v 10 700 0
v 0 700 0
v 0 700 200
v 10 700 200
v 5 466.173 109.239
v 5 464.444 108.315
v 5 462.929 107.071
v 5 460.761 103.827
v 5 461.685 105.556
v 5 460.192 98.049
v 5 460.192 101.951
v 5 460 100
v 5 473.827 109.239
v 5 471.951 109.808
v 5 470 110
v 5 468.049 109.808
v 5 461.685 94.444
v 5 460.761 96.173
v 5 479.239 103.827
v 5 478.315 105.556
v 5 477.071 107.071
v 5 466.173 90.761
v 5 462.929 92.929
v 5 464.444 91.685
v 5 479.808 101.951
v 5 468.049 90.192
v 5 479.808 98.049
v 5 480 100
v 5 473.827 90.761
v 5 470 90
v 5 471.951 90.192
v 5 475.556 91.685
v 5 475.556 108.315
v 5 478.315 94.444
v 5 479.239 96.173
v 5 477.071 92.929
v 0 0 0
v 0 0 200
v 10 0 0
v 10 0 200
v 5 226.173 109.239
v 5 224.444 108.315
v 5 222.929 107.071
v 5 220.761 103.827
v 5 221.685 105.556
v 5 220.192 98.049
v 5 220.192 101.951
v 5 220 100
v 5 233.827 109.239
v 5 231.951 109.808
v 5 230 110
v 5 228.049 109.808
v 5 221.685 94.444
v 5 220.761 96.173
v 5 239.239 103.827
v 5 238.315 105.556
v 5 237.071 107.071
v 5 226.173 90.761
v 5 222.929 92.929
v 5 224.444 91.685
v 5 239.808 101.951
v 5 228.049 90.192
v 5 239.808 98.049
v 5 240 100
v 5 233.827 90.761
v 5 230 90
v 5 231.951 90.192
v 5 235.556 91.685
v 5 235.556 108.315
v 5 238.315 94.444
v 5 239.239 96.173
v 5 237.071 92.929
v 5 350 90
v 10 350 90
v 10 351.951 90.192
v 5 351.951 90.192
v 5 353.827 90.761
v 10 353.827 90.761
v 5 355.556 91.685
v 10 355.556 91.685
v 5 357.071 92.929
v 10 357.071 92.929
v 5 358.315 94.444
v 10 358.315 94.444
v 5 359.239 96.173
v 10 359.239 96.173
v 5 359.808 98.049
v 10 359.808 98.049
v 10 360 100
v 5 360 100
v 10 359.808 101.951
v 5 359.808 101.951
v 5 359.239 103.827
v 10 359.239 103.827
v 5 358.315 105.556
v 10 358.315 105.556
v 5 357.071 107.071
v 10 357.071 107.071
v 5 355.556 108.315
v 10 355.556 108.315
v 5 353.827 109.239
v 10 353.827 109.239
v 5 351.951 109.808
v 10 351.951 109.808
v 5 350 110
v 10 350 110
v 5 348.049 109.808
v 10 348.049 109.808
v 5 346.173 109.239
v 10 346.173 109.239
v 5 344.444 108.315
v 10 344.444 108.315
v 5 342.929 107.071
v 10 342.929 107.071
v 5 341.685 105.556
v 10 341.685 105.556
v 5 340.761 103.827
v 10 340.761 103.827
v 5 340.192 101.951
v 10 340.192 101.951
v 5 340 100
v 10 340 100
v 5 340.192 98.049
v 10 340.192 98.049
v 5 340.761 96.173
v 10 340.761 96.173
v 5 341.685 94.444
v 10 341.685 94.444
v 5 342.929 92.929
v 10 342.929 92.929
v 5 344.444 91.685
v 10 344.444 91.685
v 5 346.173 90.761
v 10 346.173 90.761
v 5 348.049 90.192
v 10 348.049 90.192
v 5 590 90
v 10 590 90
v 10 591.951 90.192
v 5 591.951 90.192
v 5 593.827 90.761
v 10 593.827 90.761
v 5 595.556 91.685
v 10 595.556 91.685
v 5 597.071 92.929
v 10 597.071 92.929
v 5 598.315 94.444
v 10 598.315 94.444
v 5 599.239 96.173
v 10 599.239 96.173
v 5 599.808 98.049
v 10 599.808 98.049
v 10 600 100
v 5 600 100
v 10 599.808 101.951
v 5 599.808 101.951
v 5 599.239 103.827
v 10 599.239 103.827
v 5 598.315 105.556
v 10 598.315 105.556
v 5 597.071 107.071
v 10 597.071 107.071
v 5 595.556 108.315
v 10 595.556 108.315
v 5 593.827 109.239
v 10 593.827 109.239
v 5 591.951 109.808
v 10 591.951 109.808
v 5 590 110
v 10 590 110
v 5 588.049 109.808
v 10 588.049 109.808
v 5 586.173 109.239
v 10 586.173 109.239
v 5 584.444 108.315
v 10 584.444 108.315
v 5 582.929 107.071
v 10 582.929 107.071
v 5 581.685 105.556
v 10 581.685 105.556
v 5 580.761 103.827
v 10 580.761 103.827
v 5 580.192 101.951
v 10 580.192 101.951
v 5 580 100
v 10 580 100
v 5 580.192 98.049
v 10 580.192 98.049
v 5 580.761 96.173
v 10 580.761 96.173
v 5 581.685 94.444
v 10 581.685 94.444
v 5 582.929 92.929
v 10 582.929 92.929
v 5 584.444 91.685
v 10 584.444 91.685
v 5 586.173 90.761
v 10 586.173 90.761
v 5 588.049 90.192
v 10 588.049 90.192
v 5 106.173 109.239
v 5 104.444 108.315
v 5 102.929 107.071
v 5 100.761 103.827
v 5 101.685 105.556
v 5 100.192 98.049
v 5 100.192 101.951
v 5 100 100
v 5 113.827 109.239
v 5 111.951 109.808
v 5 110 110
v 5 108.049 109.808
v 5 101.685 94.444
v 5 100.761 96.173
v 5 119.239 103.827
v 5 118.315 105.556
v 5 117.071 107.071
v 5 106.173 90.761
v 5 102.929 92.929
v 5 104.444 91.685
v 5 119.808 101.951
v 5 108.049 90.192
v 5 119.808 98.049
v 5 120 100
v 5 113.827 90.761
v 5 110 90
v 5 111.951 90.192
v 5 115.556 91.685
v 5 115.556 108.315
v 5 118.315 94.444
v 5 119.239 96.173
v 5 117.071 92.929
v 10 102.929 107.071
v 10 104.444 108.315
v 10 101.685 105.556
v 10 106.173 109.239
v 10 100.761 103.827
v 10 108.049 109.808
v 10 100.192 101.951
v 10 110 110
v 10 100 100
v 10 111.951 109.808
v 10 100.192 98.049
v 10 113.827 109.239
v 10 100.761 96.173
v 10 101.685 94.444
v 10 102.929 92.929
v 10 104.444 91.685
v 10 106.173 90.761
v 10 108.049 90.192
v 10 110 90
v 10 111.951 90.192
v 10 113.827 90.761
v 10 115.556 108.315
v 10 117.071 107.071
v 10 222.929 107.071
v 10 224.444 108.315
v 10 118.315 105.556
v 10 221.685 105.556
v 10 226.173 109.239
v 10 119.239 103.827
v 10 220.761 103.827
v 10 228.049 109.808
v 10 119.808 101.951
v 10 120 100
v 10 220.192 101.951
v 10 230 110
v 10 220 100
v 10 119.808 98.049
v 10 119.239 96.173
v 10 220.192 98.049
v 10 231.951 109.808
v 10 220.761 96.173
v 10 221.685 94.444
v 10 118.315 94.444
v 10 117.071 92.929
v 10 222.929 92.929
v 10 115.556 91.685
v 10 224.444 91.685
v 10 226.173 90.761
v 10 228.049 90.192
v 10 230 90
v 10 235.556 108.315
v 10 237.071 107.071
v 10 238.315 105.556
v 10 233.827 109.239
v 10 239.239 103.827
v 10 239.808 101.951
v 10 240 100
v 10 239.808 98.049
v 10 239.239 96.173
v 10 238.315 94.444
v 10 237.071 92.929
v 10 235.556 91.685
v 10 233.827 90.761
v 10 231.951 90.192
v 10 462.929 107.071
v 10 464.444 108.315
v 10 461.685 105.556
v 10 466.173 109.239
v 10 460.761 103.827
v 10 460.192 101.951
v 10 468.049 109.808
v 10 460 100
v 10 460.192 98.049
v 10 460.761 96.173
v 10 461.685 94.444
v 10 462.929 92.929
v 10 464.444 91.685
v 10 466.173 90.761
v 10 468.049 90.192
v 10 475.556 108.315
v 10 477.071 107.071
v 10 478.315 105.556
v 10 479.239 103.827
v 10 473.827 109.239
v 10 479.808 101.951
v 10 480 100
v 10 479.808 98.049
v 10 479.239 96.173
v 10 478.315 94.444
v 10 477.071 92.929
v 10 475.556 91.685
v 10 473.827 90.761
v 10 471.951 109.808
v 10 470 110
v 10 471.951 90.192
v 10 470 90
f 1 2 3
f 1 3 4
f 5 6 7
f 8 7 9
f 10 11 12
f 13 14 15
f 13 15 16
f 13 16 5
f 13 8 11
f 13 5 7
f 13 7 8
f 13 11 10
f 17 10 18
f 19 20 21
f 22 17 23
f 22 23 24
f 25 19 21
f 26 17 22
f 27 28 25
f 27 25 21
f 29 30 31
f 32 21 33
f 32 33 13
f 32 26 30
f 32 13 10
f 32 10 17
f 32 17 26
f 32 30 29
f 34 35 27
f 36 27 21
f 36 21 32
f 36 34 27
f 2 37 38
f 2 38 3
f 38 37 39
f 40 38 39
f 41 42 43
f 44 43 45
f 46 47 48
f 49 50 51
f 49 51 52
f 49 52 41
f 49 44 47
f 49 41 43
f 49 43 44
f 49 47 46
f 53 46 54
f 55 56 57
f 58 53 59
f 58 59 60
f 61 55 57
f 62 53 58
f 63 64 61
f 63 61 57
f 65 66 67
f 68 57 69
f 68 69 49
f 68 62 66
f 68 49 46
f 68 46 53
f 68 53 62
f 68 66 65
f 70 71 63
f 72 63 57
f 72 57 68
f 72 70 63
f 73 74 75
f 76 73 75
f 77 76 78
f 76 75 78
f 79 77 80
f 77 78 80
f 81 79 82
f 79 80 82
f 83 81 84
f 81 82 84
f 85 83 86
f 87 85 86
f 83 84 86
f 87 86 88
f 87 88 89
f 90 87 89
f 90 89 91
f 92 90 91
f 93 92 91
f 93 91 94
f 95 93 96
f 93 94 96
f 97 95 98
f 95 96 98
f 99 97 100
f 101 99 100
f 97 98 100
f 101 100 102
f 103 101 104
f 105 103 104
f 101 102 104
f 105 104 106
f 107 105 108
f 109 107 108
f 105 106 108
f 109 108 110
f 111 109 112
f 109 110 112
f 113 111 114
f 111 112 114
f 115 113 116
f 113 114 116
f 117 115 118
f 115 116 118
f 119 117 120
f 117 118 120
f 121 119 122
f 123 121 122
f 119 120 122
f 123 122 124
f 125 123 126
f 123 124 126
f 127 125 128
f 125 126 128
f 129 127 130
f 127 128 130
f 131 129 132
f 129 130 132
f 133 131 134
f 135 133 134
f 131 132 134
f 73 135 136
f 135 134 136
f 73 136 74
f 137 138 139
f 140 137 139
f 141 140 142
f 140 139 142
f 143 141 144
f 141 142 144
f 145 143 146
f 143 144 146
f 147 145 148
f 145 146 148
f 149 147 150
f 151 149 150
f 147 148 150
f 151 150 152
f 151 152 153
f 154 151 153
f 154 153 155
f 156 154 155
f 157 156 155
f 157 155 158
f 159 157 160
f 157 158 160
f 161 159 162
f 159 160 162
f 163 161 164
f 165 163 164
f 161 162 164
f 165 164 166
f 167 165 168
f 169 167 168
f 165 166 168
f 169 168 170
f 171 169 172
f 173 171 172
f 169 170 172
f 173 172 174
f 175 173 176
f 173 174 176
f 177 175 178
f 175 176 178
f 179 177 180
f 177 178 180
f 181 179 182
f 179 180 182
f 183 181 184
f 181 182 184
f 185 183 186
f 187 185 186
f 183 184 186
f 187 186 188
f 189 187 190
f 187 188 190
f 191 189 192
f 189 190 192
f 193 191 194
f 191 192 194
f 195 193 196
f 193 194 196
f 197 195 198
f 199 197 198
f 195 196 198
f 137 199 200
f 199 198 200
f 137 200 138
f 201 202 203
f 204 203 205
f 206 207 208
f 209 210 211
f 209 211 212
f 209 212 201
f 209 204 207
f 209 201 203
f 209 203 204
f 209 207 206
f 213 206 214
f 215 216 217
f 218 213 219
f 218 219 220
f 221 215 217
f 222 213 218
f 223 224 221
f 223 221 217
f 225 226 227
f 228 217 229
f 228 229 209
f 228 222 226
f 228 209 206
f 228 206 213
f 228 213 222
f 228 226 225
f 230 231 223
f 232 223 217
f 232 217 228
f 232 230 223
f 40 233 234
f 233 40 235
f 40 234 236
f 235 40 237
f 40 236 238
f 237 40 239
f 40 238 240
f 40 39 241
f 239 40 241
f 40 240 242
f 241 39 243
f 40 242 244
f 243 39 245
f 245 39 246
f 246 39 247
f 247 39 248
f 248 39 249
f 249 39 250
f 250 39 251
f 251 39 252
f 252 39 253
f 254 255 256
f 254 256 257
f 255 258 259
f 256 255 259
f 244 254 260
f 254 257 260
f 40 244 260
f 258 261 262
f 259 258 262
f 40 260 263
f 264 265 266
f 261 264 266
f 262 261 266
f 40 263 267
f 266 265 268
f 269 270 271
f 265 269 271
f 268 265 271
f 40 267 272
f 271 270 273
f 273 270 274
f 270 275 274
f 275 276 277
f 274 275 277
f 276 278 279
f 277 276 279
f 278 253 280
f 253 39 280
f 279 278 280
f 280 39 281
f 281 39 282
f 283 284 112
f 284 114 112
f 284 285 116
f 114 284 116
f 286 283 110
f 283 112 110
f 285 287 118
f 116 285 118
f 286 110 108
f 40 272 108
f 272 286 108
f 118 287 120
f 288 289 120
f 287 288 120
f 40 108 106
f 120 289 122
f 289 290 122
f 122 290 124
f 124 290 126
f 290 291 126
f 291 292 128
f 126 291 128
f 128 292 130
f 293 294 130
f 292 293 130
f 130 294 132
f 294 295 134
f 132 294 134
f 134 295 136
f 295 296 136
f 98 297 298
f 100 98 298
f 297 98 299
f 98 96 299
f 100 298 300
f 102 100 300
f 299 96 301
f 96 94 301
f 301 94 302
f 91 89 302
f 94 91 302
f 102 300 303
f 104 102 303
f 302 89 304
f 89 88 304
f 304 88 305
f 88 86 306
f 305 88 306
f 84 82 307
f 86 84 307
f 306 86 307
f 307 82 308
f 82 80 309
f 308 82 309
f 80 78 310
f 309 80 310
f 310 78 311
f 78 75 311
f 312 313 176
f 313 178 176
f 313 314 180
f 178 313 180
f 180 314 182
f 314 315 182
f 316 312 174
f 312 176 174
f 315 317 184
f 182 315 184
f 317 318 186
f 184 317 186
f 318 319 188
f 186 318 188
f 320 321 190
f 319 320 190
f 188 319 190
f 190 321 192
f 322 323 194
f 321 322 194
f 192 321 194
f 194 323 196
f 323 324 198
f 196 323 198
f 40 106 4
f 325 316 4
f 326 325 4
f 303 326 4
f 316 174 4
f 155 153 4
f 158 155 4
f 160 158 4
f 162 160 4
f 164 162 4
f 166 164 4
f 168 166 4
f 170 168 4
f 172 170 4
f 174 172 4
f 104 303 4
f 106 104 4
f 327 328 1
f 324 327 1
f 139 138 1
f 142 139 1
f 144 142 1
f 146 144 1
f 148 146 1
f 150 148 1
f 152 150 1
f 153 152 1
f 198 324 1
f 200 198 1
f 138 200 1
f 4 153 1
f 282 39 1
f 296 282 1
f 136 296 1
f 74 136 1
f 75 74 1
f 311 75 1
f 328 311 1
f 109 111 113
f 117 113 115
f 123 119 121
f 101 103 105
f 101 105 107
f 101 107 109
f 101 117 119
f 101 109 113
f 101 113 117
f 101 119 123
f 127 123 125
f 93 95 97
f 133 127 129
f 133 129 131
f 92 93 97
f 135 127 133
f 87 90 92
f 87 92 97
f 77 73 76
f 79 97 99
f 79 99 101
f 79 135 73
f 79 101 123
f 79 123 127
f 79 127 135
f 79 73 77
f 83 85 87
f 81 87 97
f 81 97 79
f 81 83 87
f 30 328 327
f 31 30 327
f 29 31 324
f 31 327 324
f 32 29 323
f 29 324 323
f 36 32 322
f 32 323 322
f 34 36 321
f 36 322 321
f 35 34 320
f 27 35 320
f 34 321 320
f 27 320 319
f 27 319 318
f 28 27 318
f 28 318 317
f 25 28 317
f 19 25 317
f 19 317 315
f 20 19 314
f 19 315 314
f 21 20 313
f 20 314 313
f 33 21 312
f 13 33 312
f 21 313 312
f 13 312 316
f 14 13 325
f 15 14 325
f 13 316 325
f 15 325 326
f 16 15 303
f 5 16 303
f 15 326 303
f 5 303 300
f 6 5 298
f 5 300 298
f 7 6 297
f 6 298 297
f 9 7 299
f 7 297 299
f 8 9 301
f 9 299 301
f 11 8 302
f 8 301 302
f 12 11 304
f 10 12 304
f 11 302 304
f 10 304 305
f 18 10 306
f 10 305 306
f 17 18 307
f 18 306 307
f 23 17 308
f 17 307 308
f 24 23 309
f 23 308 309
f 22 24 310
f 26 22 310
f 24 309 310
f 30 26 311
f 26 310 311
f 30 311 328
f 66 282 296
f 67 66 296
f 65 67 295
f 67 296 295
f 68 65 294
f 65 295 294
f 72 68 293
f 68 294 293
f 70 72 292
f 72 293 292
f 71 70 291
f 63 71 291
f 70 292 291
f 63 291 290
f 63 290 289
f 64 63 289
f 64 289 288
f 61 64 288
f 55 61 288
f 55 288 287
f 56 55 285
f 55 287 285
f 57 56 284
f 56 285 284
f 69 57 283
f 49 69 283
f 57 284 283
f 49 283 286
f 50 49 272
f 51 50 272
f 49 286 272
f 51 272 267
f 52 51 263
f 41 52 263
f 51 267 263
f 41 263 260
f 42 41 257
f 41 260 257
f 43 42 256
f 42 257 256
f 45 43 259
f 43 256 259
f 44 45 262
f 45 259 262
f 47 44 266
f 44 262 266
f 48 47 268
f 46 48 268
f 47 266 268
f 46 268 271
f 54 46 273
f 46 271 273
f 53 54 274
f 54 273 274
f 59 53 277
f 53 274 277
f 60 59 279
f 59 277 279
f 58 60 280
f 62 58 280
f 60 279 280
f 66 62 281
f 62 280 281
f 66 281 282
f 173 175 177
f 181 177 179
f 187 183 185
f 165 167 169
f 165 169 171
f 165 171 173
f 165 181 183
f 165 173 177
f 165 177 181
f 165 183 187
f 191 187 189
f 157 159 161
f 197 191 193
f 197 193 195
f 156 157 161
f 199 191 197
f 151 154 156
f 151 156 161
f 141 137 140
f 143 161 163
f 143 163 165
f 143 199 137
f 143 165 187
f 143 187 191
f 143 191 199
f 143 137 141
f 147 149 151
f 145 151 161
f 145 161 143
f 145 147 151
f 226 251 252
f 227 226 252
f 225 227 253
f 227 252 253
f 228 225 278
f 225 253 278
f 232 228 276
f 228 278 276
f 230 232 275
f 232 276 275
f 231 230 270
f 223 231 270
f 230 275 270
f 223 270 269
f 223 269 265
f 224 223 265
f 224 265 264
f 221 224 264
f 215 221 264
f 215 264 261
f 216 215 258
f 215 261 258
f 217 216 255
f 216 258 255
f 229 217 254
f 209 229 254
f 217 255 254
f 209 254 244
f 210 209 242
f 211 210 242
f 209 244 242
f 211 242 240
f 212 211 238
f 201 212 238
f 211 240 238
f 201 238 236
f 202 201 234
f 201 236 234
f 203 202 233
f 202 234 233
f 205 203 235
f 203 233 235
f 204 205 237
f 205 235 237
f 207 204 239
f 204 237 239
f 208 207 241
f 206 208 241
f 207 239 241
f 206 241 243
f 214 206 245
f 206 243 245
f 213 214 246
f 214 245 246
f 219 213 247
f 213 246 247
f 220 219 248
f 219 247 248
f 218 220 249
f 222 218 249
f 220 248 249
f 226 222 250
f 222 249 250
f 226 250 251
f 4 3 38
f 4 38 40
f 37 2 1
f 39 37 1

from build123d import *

# Parameters (mm, degrees)
CROQUIS1_W              = 10
CROQUIS1_H              = 700
SALIENTE_EXTRUIR1_DEPTH = 200
CROQUIS2_R              = 10
CORTAR_EXTRUIR1_DEPTH   = 5


with BuildPart() as part:
    # Croquis1 → Saliente-Extruir1 (new body)
    with BuildSketch(Plane.XY):
        with Locations((5, 350)):
            Rectangle(CROQUIS1_W, CROQUIS1_H)
    extrude(amount=SALIENTE_EXTRUIR1_DEPTH)

    # Croquis2 → Cortar-Extruir1 (cut)
    with BuildSketch(Plane(origin=(10, 0, 0), x_dir=(0, 0, -1), z_dir=(1, 0, 0))):
        with Locations((-100, 110)):
            Circle(CROQUIS2_R)
        with Locations((-100, 230)):
            Circle(CROQUIS2_R)
        with Locations((-100, 350)):
            Circle(CROQUIS2_R)
        with Locations((-100, 470)):
            Circle(CROQUIS2_R)
        with Locations((-100, 590)):
            Circle(CROQUIS2_R)
    extrude(amount=-CORTAR_EXTRUIR1_DEPTH, mode=Mode.SUBTRACT)


solid = part.part
